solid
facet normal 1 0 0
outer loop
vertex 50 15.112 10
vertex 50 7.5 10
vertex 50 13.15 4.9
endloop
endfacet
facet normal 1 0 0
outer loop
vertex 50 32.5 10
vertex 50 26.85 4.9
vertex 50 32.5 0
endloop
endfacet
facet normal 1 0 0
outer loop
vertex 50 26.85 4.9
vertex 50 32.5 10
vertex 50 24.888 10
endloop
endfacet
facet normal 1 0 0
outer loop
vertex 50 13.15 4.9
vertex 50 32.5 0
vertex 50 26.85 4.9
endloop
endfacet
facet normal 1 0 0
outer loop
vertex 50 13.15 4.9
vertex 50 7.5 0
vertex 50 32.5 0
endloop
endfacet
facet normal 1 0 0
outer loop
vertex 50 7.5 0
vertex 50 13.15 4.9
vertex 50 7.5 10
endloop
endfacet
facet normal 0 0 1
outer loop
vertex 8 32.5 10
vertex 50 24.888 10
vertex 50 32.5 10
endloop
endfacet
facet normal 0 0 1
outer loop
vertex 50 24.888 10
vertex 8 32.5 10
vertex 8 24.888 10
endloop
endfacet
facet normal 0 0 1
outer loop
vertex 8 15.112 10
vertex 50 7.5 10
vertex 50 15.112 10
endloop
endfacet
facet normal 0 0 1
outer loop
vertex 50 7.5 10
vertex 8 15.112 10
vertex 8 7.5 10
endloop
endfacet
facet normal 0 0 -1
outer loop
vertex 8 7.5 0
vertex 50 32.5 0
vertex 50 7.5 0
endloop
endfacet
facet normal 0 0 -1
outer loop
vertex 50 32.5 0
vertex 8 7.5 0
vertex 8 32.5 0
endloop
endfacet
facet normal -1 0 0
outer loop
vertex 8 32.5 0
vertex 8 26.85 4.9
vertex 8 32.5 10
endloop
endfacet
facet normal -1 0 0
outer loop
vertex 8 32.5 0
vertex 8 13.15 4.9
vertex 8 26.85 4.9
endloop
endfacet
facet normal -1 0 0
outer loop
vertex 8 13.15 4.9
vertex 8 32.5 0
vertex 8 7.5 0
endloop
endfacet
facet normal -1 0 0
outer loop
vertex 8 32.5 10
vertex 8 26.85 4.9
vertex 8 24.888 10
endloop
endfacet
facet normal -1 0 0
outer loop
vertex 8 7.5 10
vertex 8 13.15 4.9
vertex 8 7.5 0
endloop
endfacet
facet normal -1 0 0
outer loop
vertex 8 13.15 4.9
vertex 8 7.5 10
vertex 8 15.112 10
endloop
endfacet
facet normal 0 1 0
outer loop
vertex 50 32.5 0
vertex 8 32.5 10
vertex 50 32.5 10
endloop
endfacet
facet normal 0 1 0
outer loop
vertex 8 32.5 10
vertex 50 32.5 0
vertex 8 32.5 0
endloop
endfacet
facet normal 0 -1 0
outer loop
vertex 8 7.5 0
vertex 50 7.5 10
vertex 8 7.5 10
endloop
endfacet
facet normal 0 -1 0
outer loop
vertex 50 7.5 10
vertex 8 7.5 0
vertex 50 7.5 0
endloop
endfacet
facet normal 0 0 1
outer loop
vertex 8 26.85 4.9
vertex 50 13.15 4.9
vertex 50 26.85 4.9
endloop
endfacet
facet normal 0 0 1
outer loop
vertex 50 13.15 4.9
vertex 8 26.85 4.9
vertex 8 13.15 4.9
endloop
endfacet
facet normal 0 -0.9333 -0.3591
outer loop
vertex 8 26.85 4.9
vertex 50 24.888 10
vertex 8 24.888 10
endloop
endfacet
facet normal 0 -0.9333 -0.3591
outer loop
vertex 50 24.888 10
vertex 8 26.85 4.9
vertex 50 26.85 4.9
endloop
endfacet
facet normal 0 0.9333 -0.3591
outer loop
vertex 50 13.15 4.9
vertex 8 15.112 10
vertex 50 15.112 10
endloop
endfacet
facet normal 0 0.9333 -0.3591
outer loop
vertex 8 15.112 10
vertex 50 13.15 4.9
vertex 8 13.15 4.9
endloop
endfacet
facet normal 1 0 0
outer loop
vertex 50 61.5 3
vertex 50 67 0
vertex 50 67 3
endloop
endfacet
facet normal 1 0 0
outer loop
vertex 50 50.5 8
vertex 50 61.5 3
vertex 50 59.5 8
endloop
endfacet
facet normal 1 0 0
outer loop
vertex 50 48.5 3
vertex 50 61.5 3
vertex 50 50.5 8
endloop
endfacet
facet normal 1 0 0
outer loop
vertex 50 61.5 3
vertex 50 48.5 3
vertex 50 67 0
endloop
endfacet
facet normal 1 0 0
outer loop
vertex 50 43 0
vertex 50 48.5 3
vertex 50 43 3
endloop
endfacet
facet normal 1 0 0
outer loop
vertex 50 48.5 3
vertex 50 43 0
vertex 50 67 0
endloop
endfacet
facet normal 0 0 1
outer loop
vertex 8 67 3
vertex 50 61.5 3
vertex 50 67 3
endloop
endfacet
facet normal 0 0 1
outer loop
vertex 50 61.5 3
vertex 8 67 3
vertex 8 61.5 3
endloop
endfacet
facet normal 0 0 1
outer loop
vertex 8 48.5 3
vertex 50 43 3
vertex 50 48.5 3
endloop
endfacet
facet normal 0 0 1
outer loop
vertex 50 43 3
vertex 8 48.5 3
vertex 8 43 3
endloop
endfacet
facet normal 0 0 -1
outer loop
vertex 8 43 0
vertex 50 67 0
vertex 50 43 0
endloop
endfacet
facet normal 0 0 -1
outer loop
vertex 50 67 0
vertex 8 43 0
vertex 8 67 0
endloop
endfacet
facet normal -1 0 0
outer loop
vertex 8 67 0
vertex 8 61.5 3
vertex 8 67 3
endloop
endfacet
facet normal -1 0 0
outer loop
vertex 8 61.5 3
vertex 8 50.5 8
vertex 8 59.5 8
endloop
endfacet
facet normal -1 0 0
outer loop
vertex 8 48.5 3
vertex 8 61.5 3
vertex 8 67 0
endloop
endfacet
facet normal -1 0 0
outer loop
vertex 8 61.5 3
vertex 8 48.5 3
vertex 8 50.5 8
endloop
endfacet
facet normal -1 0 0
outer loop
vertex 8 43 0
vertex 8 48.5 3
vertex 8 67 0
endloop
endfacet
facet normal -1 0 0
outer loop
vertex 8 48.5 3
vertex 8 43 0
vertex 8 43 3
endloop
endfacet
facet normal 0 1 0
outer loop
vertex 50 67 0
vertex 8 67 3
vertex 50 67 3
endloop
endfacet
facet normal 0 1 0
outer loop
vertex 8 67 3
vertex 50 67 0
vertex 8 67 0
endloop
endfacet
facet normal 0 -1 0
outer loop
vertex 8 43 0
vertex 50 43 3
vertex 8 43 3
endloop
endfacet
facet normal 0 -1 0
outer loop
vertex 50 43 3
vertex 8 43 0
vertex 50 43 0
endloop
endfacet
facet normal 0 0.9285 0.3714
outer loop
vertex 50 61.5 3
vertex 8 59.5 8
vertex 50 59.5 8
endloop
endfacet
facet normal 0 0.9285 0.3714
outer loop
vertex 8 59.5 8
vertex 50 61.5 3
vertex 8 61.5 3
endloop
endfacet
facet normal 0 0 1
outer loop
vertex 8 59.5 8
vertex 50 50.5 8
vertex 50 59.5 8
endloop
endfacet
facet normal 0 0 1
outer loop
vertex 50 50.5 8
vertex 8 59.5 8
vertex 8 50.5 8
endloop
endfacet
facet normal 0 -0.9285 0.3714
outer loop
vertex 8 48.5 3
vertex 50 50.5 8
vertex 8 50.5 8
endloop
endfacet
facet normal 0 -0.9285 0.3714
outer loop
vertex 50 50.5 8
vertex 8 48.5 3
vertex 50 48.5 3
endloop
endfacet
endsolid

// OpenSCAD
/*
Sample 052: Schwalbenschwanz-Verbinder — leichtgängig 0,35 mm
Generated from the FDM Mechanical Sample Library.
Units: millimetres.

Override examples:
  openscad -o custom.stl -D 'view="plate"' -D 'render_fn=64' model.scad
  openscad -o preview.png -D 'view="assembly"' model.scad
*/
use <../../../library/fdm_mechanisms.scad>

render_fn = is_undef(render_fn) ? 48 : render_fn;
view = is_undef(view) ? "plate" : view;
$fn = render_fn;

sample_dovetail_joiner(
    view=view,
    clearance=0.35,
    length=42
);
